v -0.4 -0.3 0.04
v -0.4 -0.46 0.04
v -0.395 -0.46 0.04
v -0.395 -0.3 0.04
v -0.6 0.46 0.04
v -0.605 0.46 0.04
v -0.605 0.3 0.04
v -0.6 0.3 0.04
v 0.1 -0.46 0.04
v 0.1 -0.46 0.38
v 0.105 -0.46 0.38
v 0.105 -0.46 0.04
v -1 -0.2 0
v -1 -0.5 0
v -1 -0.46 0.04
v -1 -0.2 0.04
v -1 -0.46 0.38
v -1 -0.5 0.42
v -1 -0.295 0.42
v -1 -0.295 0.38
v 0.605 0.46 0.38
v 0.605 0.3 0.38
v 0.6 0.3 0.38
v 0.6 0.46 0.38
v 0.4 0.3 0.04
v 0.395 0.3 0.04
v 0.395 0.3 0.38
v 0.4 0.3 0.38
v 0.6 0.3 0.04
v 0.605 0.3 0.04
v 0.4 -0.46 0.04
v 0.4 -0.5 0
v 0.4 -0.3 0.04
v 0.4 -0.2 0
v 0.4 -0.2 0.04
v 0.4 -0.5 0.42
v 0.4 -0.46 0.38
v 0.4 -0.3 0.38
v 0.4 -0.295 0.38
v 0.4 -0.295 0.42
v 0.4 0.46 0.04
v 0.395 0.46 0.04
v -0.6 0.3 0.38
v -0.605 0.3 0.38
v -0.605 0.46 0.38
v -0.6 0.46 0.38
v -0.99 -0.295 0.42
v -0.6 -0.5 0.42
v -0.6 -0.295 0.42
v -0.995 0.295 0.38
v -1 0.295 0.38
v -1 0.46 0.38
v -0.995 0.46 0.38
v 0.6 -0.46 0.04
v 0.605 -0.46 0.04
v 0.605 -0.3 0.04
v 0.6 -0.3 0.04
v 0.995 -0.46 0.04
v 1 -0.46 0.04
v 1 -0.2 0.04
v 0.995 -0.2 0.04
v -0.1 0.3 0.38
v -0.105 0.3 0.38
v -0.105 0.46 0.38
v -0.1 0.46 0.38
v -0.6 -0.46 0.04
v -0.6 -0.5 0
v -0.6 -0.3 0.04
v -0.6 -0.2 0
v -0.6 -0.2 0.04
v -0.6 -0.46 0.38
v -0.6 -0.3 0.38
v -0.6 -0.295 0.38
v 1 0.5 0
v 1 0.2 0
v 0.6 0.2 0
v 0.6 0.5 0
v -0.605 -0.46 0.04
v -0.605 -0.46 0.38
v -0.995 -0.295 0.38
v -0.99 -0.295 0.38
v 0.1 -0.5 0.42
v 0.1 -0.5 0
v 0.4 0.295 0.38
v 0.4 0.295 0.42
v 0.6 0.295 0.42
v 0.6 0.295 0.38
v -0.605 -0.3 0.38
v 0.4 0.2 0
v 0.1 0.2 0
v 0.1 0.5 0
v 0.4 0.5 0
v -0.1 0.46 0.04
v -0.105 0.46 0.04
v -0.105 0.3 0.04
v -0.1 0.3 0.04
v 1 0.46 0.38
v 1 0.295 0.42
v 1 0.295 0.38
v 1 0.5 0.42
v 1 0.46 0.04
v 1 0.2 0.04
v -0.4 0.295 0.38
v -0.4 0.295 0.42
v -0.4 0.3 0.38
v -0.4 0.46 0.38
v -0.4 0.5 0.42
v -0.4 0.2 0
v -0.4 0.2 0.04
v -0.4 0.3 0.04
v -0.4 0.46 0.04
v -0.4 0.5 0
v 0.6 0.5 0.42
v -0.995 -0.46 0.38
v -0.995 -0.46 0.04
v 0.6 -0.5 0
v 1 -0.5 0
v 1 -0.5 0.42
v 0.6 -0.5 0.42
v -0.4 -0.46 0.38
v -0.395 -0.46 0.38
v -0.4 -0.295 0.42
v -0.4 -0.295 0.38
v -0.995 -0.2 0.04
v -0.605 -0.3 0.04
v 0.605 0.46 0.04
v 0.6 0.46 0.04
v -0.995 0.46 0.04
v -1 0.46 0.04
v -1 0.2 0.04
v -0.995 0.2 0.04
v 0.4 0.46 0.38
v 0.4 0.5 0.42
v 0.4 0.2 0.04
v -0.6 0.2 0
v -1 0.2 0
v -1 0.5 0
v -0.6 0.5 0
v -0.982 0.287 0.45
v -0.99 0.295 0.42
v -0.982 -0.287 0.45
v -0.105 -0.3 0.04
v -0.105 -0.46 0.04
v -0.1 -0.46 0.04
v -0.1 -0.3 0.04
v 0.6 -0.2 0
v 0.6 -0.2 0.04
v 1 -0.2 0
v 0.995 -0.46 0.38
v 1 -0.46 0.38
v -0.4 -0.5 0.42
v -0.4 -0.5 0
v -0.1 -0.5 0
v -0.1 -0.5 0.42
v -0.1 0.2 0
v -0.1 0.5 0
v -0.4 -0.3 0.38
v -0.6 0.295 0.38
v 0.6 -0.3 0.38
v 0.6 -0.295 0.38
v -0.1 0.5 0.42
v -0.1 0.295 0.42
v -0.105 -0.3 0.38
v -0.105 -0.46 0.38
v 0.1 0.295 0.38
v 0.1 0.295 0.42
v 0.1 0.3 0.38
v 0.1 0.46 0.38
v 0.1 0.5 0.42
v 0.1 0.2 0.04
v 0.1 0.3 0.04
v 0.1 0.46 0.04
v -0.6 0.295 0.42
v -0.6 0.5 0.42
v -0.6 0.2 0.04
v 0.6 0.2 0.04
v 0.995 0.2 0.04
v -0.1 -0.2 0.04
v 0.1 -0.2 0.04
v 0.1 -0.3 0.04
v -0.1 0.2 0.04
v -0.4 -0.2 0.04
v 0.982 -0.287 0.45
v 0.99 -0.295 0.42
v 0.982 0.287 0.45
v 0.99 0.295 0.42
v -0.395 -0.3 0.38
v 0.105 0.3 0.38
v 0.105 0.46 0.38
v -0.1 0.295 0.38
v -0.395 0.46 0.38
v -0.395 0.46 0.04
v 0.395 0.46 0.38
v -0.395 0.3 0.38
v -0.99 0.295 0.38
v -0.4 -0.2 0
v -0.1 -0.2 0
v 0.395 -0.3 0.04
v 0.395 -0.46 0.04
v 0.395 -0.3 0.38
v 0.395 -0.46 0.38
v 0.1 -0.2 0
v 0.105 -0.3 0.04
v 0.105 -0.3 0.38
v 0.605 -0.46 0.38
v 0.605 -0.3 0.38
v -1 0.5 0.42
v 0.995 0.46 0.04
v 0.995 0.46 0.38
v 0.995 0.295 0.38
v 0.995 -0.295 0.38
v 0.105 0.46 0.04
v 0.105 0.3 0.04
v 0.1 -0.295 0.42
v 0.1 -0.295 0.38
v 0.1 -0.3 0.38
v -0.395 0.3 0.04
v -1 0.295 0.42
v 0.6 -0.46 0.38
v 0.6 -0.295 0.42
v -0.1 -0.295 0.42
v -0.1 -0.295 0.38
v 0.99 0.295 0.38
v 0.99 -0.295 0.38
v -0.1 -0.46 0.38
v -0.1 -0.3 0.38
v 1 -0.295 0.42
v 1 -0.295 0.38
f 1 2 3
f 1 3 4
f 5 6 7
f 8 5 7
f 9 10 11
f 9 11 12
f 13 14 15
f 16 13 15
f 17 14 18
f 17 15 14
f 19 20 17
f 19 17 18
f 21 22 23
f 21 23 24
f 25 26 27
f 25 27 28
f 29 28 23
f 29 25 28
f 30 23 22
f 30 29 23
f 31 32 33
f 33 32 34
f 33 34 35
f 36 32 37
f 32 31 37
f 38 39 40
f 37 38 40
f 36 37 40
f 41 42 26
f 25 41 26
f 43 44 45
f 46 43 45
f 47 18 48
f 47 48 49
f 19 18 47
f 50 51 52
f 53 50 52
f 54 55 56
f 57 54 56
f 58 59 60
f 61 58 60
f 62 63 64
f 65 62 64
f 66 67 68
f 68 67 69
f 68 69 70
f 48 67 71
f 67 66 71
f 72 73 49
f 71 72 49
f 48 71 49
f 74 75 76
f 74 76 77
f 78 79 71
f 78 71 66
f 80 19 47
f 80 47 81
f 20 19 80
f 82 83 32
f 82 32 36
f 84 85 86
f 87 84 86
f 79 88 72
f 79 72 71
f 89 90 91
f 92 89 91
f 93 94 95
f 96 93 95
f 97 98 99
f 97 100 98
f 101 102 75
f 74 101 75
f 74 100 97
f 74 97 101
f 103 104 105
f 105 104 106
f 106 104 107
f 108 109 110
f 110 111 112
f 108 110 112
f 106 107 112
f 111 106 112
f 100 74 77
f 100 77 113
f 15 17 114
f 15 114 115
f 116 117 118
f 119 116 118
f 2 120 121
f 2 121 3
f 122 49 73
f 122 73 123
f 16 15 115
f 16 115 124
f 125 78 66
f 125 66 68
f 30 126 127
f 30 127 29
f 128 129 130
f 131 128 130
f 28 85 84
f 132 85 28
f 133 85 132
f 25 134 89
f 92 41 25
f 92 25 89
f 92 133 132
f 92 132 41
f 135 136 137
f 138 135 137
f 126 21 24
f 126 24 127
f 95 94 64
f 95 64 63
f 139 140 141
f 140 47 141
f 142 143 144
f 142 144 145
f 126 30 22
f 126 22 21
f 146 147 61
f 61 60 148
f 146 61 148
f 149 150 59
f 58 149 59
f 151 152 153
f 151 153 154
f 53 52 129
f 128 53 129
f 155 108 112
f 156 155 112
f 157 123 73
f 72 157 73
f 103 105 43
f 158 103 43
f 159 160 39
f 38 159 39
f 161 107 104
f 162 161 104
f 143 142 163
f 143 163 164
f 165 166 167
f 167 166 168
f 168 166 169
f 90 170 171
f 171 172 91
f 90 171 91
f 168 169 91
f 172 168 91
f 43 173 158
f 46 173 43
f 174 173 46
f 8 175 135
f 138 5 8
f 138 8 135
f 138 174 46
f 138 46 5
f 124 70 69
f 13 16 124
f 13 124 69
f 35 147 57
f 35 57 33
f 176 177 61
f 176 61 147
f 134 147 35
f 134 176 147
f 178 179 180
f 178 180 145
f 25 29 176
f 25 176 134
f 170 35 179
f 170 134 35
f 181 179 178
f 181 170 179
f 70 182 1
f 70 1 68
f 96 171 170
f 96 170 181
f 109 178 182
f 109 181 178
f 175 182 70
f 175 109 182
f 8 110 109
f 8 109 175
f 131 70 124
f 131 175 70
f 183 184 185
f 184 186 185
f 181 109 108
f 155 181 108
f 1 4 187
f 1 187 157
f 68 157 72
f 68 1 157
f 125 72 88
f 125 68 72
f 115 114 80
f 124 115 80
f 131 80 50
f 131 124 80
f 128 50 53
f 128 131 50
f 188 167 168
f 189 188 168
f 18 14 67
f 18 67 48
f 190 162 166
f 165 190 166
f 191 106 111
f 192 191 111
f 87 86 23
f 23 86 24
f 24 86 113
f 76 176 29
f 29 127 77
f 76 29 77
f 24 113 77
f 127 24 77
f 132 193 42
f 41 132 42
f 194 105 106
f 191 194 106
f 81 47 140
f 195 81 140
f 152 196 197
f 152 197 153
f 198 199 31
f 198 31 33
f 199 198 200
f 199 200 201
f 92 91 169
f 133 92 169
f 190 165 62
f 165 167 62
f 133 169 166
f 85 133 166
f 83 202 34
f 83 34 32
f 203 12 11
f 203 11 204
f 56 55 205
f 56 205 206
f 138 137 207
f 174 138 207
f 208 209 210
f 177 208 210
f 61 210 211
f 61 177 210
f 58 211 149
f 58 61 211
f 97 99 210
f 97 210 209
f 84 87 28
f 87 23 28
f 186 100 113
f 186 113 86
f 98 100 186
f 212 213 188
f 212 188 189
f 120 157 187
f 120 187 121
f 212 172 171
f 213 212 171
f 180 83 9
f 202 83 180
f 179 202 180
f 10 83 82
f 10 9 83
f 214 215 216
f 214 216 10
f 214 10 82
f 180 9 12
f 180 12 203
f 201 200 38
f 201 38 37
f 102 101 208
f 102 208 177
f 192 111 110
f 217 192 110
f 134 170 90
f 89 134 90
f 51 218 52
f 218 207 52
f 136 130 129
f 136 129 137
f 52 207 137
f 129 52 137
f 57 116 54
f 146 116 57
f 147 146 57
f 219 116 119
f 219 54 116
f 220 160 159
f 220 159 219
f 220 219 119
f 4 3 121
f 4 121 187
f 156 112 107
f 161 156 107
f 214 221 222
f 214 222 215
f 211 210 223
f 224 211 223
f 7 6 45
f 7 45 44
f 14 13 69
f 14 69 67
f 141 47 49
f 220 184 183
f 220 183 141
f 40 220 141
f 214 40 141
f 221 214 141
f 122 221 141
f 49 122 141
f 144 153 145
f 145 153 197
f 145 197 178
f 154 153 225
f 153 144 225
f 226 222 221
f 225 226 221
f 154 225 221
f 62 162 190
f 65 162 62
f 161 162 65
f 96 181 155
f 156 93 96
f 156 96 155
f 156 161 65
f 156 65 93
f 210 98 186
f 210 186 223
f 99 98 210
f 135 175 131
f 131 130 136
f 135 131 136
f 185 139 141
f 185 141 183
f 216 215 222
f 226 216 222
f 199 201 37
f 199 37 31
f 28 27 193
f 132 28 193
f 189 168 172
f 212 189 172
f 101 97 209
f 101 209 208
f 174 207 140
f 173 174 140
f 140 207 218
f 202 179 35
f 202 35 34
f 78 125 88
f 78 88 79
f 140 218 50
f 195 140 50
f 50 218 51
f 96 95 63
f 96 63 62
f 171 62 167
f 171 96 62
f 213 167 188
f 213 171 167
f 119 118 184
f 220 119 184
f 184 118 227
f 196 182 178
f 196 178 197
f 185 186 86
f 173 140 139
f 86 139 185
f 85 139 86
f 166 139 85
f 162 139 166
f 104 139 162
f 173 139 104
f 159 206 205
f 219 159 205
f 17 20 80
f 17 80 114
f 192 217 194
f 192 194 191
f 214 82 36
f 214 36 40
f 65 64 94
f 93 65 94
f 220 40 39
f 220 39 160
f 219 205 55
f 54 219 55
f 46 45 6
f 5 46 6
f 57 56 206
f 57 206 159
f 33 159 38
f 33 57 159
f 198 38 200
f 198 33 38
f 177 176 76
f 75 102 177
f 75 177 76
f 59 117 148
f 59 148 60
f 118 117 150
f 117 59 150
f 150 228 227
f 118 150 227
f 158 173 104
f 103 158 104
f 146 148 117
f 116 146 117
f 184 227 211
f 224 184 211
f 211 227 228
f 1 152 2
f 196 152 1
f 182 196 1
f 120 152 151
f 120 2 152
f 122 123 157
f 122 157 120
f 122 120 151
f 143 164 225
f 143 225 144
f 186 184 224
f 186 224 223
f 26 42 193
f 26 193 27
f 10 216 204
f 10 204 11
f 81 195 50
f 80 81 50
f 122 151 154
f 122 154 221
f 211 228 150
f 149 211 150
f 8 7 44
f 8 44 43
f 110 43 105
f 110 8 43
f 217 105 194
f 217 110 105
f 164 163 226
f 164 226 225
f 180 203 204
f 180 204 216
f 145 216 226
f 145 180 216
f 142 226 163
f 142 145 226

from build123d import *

# Parameters (mm, degrees)
EXTRUDE_START               = 0.04
EXTRUDE_1_DEPTH             = 0.34
EXTRUDE_START_2             = 0.42
SKETCH_2_W                  = 1.98
SKETCH_2_H                  = 0.59
EXTRUDE_1_2_DEPTH           = 0.03
EXTRUDE_1_2_TAPER           = 15
EXTRUDE_1_2_OTHER_WAY_DEPTH = 0.04
EXTRUDE_START_3             = -0.4
EXTRUDE_3_DEPTH             = 0.3
EXTRUDE_START_4             = -1
EXTRUDE_4_DEPTH             = 0.4
EXTRUDE_START_5             = 1
EXTRUDE_5_DEPTH             = 0.4
PATTERN_LINEAR_1_COUNT      = 2
PATTERN_LINEAR_1_PITCH      = 0.5


with BuildPart() as part:
    # Эскиз1 → Extrude 1 (new body)
    with BuildSketch(Plane.XY.offset(EXTRUDE_START)):
        Polygon((-0.605, 0.49), (-0.605, 0.3), (-0.395, 0.3), (-0.395, 0.49), (-0.105, 0.49), (-0.105, 0.3), (0.105, 0.3), (0.105, 0.49), (0.395, 0.49), (0.395, 0.3), (0.605, 0.3), (0.605, 0.49), (0.995, 0.49), (0.995, -0.49), (0.605, -0.49), (0.605, -0.3), (0.395, -0.3), (0.395, -0.49), (0.105, -0.49), (0.105, -0.3), (-0.105, -0.3), (-0.105, -0.49), (-0.395, -0.49), (-0.395, -0.3), (-0.605, -0.3), (-0.605, -0.49), (-0.995, -0.49), (-0.995, 0.49), align=None)
    extrude(amount=EXTRUDE_1_DEPTH)

    # Эскиз2 → Extrude 1 2 (add)
    with BuildSketch(Plane.XY.offset(EXTRUDE_START_2)):
        Rectangle(SKETCH_2_W, SKETCH_2_H)
    extrude(amount=EXTRUDE_1_2_DEPTH, taper=EXTRUDE_1_2_TAPER)

    # Эскиз2 → Extrude 1 2 other way (add)
    with BuildSketch(Plane.XY.offset(EXTRUDE_START_2)):
        Rectangle(SKETCH_2_W, SKETCH_2_H)
    extrude(amount=-EXTRUDE_1_2_OTHER_WAY_DEPTH)

    # Эскиз3 → Бобышка-Вытянуть3 (add)
    with BuildSketch(Plane(origin=(0, 0, 0), x_dir=(0, 0, -1), z_dir=(1, 0, 0)).offset(EXTRUDE_START_3)):
        Polygon((-0.42, 0.295), (-0.38, 0.295), (-0.38, 0.46), (-0.04, 0.46), (-0.04, 0.2), (0, 0.2), (0, 0.5), (-0.42, 0.5), align=None)
        Polygon((-0.04, -0.2), (0, -0.2), (0, -0.5), (-0.42, -0.5), (-0.42, -0.295), (-0.38, -0.295), (-0.38, -0.46), (-0.04, -0.46), align=None)
    extrude_3 = extrude(amount=EXTRUDE_3_DEPTH)

    # Эскиз3<2> → Бобышка-Вытянуть4 (add)
    with BuildSketch(Plane(origin=(0, 0, 0), x_dir=(0, 0, -1), z_dir=(1, 0, 0)).offset(EXTRUDE_START_4)):
        Polygon((-0.42, 0.295), (-0.38, 0.295), (-0.38, 0.46), (-0.04, 0.46), (-0.04, 0.2), (0, 0.2), (0, 0.5), (-0.42, 0.5), align=None)
        Polygon((-0.04, -0.2), (0, -0.2), (0, -0.5), (-0.42, -0.5), (-0.42, -0.295), (-0.38, -0.295), (-0.38, -0.46), (-0.04, -0.46), align=None)
    extrude(amount=EXTRUDE_4_DEPTH)

    # Эскиз3<3> → Бобышка-Вытянуть5 (add)
    with BuildSketch(Plane(origin=(0, 0, 0), x_dir=(0, 0, -1), z_dir=(1, 0, 0)).offset(EXTRUDE_START_5)):
        Polygon((-0.42, 0.295), (-0.38, 0.295), (-0.38, 0.46), (-0.04, 0.46), (-0.04, 0.2), (0, 0.2), (0, 0.5), (-0.42, 0.5), align=None)
        Polygon((-0.04, -0.2), (0, -0.2), (0, -0.5), (-0.42, -0.5), (-0.42, -0.295), (-0.38, -0.295), (-0.38, -0.46), (-0.04, -0.46), align=None)
    extrude(amount=-EXTRUDE_5_DEPTH)

    # Линейный массив1: Бобышка-Вытянуть3 ×2
    with Locations(*[(i * PATTERN_LINEAR_1_PITCH, 0, 0) for i in range(1, PATTERN_LINEAR_1_COUNT)]):
        add(extrude_3)


solid = part.part
